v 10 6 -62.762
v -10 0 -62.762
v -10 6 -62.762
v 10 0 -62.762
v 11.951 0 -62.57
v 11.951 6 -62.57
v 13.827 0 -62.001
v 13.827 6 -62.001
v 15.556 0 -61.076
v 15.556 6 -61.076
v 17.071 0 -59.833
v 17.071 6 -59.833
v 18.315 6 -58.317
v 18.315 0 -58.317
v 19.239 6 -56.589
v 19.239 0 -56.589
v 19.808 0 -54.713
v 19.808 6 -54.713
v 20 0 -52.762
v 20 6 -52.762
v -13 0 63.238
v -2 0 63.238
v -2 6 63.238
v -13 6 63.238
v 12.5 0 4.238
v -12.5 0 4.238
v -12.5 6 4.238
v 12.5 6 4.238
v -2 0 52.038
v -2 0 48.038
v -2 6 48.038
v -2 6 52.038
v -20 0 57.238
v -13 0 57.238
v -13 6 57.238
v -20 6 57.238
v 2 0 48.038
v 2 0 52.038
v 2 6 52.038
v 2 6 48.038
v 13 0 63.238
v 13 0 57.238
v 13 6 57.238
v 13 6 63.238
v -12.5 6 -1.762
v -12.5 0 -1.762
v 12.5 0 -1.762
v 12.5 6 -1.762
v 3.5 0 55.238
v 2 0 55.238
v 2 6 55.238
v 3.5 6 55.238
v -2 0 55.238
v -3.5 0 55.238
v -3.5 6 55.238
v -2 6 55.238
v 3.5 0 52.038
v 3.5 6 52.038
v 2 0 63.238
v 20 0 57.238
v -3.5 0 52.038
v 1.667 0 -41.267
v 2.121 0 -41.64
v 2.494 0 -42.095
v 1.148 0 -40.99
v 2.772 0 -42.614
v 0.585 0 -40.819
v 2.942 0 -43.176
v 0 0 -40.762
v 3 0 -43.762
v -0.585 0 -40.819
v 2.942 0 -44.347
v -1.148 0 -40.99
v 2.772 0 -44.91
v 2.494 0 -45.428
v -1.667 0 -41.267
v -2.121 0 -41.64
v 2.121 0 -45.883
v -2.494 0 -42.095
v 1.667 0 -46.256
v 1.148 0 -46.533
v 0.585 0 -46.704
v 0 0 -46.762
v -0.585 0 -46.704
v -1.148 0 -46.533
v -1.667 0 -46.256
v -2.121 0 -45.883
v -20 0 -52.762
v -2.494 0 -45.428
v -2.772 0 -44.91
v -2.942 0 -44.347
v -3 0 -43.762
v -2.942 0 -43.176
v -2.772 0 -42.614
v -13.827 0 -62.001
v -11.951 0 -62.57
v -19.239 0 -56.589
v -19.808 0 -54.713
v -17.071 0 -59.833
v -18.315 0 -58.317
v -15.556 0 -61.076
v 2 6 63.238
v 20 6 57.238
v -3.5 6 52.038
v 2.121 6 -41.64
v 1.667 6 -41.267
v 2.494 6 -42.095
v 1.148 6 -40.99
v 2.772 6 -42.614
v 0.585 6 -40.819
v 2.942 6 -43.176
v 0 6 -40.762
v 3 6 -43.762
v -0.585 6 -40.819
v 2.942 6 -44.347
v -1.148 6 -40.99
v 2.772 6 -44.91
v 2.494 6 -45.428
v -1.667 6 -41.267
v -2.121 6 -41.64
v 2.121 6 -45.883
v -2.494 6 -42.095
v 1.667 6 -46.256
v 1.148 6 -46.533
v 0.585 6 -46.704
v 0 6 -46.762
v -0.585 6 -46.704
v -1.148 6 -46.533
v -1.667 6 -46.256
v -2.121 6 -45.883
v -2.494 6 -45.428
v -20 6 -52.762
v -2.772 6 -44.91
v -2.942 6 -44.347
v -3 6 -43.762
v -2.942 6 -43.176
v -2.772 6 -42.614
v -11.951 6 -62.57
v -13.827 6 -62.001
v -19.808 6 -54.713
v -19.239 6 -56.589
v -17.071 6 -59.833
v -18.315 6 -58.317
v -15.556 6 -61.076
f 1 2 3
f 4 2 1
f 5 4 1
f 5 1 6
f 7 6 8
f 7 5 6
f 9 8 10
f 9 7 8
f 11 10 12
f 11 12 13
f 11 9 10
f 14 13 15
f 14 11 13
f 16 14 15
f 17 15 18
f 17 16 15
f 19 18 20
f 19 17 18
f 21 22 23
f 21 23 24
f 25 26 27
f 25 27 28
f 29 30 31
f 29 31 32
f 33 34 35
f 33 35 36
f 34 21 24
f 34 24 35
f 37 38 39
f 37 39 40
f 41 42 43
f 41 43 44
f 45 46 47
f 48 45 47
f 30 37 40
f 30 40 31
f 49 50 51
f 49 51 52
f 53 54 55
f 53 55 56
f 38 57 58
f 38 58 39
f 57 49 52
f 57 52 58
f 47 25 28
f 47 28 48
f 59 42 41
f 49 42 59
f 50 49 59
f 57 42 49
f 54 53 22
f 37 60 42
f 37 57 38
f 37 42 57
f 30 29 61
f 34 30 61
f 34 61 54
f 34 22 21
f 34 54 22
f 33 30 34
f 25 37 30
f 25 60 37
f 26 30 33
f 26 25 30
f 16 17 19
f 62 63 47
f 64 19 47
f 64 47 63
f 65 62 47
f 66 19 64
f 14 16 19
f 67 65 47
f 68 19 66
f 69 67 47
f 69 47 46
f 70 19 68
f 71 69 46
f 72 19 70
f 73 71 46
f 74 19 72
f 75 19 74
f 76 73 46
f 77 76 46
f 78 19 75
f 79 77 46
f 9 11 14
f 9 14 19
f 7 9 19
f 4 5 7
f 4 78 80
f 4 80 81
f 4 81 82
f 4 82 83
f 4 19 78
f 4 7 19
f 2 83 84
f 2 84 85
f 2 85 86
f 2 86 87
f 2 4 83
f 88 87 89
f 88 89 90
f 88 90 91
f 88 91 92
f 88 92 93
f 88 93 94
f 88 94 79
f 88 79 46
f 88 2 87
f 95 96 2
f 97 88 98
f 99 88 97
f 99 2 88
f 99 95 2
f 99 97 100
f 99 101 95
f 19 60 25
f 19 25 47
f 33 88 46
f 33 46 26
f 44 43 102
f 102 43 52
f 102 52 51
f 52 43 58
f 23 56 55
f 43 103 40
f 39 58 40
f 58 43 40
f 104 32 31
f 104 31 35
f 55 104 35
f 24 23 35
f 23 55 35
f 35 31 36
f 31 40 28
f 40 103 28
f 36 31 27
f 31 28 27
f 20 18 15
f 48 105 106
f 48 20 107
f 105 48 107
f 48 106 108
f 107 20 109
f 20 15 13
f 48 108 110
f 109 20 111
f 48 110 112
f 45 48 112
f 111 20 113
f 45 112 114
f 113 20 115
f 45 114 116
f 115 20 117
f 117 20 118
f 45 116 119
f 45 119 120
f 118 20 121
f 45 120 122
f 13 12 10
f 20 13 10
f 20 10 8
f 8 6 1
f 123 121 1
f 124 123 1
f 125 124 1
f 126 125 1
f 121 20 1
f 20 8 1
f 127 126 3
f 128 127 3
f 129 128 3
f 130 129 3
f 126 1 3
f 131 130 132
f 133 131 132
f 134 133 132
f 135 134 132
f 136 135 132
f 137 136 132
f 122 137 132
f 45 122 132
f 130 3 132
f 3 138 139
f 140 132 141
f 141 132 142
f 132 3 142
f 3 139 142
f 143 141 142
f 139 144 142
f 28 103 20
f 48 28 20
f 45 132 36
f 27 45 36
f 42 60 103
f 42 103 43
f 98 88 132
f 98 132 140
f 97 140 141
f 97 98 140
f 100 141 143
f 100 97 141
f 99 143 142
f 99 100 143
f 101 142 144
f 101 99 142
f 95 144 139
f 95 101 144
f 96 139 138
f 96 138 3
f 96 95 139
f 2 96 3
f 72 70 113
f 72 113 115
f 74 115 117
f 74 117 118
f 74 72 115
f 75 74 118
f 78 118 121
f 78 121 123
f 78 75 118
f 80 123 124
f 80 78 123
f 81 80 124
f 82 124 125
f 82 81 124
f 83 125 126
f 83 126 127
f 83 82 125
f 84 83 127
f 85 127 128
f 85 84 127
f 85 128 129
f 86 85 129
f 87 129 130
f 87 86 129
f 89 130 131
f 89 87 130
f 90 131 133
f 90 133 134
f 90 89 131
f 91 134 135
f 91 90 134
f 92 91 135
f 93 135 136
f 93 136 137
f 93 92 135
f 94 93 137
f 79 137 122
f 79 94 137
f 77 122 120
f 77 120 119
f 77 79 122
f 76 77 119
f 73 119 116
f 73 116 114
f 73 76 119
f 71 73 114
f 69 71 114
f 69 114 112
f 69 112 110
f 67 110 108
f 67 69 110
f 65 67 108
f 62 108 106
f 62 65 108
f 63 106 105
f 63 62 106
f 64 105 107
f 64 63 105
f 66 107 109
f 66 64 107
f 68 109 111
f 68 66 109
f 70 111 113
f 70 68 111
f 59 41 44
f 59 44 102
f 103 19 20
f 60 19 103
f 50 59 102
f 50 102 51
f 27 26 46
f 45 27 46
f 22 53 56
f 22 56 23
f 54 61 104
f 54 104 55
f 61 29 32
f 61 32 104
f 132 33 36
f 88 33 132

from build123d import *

# Parameters (mm, degrees)
SKETCH1_R           = 3
SKETCH1_W           = 25
SKETCH1_H           = 6
BOSS_EXTRUDE1_DEPTH = 6


with BuildPart() as part:
    # Sketch1 → Boss-Extrude1 (new body)
    with BuildSketch(Plane(origin=(0, 0, 0), x_dir=(1, 0, 0), z_dir=(0, 1, 0))):
        with BuildLine():
            Line((-10, 62.761766306), (10, 62.761766306))
            ThreePointArc((10, 62.761766306), (17.071067812, 59.832834118), (20, 52.761766306))
            Line((20, 52.761766306), (20, -57.238233694))
            Line((20, -57.238233694), (13, -57.238233694))
            Line((13, -57.238233694), (13, -63.238233694))
            Line((13, -63.238233694), (2, -63.238233694))
            Line((2, -63.238233694), (2, -55.238233694))
            Line((2, -55.238233694), (3.5, -55.238233694))
            Line((3.5, -55.238233694), (3.5, -52.038233694))
            Line((3.5, -52.038233694), (2, -52.038233694))
            Line((2, -52.038233694), (2, -48.038233694))
            Line((2, -48.038233694), (-2, -48.038233694))
            Line((-2, -48.038233694), (-2, -52.038233694))
            Line((-2, -52.038233694), (-3.5, -52.038233694))
            Line((-3.5, -52.038233694), (-3.5, -55.238233694))
            Line((-3.5, -55.238233694), (-2, -55.238233694))
            Line((-2, -55.238233694), (-2, -63.238233694))
            Line((-2, -63.238233694), (-13, -63.238233694))
            Line((-13, -63.238233694), (-13, -57.238233694))
            Line((-13, -57.238233694), (-20, -57.238233694))
            Line((-20, -57.238233694), (-20, 52.761766306))
            ThreePointArc((-20, 52.761766306), (-17.071067812, 59.832834118), (-10, 62.761766306))
        make_face()
        with Locations((0, 43.761766306)):
            Circle(SKETCH1_R, mode=Mode.SUBTRACT)
        with Locations((0, -1.238233694)):
            Rectangle(SKETCH1_W, SKETCH1_H, mode=Mode.SUBTRACT)
    extrude(amount=BOSS_EXTRUDE1_DEPTH)


solid = part.part
